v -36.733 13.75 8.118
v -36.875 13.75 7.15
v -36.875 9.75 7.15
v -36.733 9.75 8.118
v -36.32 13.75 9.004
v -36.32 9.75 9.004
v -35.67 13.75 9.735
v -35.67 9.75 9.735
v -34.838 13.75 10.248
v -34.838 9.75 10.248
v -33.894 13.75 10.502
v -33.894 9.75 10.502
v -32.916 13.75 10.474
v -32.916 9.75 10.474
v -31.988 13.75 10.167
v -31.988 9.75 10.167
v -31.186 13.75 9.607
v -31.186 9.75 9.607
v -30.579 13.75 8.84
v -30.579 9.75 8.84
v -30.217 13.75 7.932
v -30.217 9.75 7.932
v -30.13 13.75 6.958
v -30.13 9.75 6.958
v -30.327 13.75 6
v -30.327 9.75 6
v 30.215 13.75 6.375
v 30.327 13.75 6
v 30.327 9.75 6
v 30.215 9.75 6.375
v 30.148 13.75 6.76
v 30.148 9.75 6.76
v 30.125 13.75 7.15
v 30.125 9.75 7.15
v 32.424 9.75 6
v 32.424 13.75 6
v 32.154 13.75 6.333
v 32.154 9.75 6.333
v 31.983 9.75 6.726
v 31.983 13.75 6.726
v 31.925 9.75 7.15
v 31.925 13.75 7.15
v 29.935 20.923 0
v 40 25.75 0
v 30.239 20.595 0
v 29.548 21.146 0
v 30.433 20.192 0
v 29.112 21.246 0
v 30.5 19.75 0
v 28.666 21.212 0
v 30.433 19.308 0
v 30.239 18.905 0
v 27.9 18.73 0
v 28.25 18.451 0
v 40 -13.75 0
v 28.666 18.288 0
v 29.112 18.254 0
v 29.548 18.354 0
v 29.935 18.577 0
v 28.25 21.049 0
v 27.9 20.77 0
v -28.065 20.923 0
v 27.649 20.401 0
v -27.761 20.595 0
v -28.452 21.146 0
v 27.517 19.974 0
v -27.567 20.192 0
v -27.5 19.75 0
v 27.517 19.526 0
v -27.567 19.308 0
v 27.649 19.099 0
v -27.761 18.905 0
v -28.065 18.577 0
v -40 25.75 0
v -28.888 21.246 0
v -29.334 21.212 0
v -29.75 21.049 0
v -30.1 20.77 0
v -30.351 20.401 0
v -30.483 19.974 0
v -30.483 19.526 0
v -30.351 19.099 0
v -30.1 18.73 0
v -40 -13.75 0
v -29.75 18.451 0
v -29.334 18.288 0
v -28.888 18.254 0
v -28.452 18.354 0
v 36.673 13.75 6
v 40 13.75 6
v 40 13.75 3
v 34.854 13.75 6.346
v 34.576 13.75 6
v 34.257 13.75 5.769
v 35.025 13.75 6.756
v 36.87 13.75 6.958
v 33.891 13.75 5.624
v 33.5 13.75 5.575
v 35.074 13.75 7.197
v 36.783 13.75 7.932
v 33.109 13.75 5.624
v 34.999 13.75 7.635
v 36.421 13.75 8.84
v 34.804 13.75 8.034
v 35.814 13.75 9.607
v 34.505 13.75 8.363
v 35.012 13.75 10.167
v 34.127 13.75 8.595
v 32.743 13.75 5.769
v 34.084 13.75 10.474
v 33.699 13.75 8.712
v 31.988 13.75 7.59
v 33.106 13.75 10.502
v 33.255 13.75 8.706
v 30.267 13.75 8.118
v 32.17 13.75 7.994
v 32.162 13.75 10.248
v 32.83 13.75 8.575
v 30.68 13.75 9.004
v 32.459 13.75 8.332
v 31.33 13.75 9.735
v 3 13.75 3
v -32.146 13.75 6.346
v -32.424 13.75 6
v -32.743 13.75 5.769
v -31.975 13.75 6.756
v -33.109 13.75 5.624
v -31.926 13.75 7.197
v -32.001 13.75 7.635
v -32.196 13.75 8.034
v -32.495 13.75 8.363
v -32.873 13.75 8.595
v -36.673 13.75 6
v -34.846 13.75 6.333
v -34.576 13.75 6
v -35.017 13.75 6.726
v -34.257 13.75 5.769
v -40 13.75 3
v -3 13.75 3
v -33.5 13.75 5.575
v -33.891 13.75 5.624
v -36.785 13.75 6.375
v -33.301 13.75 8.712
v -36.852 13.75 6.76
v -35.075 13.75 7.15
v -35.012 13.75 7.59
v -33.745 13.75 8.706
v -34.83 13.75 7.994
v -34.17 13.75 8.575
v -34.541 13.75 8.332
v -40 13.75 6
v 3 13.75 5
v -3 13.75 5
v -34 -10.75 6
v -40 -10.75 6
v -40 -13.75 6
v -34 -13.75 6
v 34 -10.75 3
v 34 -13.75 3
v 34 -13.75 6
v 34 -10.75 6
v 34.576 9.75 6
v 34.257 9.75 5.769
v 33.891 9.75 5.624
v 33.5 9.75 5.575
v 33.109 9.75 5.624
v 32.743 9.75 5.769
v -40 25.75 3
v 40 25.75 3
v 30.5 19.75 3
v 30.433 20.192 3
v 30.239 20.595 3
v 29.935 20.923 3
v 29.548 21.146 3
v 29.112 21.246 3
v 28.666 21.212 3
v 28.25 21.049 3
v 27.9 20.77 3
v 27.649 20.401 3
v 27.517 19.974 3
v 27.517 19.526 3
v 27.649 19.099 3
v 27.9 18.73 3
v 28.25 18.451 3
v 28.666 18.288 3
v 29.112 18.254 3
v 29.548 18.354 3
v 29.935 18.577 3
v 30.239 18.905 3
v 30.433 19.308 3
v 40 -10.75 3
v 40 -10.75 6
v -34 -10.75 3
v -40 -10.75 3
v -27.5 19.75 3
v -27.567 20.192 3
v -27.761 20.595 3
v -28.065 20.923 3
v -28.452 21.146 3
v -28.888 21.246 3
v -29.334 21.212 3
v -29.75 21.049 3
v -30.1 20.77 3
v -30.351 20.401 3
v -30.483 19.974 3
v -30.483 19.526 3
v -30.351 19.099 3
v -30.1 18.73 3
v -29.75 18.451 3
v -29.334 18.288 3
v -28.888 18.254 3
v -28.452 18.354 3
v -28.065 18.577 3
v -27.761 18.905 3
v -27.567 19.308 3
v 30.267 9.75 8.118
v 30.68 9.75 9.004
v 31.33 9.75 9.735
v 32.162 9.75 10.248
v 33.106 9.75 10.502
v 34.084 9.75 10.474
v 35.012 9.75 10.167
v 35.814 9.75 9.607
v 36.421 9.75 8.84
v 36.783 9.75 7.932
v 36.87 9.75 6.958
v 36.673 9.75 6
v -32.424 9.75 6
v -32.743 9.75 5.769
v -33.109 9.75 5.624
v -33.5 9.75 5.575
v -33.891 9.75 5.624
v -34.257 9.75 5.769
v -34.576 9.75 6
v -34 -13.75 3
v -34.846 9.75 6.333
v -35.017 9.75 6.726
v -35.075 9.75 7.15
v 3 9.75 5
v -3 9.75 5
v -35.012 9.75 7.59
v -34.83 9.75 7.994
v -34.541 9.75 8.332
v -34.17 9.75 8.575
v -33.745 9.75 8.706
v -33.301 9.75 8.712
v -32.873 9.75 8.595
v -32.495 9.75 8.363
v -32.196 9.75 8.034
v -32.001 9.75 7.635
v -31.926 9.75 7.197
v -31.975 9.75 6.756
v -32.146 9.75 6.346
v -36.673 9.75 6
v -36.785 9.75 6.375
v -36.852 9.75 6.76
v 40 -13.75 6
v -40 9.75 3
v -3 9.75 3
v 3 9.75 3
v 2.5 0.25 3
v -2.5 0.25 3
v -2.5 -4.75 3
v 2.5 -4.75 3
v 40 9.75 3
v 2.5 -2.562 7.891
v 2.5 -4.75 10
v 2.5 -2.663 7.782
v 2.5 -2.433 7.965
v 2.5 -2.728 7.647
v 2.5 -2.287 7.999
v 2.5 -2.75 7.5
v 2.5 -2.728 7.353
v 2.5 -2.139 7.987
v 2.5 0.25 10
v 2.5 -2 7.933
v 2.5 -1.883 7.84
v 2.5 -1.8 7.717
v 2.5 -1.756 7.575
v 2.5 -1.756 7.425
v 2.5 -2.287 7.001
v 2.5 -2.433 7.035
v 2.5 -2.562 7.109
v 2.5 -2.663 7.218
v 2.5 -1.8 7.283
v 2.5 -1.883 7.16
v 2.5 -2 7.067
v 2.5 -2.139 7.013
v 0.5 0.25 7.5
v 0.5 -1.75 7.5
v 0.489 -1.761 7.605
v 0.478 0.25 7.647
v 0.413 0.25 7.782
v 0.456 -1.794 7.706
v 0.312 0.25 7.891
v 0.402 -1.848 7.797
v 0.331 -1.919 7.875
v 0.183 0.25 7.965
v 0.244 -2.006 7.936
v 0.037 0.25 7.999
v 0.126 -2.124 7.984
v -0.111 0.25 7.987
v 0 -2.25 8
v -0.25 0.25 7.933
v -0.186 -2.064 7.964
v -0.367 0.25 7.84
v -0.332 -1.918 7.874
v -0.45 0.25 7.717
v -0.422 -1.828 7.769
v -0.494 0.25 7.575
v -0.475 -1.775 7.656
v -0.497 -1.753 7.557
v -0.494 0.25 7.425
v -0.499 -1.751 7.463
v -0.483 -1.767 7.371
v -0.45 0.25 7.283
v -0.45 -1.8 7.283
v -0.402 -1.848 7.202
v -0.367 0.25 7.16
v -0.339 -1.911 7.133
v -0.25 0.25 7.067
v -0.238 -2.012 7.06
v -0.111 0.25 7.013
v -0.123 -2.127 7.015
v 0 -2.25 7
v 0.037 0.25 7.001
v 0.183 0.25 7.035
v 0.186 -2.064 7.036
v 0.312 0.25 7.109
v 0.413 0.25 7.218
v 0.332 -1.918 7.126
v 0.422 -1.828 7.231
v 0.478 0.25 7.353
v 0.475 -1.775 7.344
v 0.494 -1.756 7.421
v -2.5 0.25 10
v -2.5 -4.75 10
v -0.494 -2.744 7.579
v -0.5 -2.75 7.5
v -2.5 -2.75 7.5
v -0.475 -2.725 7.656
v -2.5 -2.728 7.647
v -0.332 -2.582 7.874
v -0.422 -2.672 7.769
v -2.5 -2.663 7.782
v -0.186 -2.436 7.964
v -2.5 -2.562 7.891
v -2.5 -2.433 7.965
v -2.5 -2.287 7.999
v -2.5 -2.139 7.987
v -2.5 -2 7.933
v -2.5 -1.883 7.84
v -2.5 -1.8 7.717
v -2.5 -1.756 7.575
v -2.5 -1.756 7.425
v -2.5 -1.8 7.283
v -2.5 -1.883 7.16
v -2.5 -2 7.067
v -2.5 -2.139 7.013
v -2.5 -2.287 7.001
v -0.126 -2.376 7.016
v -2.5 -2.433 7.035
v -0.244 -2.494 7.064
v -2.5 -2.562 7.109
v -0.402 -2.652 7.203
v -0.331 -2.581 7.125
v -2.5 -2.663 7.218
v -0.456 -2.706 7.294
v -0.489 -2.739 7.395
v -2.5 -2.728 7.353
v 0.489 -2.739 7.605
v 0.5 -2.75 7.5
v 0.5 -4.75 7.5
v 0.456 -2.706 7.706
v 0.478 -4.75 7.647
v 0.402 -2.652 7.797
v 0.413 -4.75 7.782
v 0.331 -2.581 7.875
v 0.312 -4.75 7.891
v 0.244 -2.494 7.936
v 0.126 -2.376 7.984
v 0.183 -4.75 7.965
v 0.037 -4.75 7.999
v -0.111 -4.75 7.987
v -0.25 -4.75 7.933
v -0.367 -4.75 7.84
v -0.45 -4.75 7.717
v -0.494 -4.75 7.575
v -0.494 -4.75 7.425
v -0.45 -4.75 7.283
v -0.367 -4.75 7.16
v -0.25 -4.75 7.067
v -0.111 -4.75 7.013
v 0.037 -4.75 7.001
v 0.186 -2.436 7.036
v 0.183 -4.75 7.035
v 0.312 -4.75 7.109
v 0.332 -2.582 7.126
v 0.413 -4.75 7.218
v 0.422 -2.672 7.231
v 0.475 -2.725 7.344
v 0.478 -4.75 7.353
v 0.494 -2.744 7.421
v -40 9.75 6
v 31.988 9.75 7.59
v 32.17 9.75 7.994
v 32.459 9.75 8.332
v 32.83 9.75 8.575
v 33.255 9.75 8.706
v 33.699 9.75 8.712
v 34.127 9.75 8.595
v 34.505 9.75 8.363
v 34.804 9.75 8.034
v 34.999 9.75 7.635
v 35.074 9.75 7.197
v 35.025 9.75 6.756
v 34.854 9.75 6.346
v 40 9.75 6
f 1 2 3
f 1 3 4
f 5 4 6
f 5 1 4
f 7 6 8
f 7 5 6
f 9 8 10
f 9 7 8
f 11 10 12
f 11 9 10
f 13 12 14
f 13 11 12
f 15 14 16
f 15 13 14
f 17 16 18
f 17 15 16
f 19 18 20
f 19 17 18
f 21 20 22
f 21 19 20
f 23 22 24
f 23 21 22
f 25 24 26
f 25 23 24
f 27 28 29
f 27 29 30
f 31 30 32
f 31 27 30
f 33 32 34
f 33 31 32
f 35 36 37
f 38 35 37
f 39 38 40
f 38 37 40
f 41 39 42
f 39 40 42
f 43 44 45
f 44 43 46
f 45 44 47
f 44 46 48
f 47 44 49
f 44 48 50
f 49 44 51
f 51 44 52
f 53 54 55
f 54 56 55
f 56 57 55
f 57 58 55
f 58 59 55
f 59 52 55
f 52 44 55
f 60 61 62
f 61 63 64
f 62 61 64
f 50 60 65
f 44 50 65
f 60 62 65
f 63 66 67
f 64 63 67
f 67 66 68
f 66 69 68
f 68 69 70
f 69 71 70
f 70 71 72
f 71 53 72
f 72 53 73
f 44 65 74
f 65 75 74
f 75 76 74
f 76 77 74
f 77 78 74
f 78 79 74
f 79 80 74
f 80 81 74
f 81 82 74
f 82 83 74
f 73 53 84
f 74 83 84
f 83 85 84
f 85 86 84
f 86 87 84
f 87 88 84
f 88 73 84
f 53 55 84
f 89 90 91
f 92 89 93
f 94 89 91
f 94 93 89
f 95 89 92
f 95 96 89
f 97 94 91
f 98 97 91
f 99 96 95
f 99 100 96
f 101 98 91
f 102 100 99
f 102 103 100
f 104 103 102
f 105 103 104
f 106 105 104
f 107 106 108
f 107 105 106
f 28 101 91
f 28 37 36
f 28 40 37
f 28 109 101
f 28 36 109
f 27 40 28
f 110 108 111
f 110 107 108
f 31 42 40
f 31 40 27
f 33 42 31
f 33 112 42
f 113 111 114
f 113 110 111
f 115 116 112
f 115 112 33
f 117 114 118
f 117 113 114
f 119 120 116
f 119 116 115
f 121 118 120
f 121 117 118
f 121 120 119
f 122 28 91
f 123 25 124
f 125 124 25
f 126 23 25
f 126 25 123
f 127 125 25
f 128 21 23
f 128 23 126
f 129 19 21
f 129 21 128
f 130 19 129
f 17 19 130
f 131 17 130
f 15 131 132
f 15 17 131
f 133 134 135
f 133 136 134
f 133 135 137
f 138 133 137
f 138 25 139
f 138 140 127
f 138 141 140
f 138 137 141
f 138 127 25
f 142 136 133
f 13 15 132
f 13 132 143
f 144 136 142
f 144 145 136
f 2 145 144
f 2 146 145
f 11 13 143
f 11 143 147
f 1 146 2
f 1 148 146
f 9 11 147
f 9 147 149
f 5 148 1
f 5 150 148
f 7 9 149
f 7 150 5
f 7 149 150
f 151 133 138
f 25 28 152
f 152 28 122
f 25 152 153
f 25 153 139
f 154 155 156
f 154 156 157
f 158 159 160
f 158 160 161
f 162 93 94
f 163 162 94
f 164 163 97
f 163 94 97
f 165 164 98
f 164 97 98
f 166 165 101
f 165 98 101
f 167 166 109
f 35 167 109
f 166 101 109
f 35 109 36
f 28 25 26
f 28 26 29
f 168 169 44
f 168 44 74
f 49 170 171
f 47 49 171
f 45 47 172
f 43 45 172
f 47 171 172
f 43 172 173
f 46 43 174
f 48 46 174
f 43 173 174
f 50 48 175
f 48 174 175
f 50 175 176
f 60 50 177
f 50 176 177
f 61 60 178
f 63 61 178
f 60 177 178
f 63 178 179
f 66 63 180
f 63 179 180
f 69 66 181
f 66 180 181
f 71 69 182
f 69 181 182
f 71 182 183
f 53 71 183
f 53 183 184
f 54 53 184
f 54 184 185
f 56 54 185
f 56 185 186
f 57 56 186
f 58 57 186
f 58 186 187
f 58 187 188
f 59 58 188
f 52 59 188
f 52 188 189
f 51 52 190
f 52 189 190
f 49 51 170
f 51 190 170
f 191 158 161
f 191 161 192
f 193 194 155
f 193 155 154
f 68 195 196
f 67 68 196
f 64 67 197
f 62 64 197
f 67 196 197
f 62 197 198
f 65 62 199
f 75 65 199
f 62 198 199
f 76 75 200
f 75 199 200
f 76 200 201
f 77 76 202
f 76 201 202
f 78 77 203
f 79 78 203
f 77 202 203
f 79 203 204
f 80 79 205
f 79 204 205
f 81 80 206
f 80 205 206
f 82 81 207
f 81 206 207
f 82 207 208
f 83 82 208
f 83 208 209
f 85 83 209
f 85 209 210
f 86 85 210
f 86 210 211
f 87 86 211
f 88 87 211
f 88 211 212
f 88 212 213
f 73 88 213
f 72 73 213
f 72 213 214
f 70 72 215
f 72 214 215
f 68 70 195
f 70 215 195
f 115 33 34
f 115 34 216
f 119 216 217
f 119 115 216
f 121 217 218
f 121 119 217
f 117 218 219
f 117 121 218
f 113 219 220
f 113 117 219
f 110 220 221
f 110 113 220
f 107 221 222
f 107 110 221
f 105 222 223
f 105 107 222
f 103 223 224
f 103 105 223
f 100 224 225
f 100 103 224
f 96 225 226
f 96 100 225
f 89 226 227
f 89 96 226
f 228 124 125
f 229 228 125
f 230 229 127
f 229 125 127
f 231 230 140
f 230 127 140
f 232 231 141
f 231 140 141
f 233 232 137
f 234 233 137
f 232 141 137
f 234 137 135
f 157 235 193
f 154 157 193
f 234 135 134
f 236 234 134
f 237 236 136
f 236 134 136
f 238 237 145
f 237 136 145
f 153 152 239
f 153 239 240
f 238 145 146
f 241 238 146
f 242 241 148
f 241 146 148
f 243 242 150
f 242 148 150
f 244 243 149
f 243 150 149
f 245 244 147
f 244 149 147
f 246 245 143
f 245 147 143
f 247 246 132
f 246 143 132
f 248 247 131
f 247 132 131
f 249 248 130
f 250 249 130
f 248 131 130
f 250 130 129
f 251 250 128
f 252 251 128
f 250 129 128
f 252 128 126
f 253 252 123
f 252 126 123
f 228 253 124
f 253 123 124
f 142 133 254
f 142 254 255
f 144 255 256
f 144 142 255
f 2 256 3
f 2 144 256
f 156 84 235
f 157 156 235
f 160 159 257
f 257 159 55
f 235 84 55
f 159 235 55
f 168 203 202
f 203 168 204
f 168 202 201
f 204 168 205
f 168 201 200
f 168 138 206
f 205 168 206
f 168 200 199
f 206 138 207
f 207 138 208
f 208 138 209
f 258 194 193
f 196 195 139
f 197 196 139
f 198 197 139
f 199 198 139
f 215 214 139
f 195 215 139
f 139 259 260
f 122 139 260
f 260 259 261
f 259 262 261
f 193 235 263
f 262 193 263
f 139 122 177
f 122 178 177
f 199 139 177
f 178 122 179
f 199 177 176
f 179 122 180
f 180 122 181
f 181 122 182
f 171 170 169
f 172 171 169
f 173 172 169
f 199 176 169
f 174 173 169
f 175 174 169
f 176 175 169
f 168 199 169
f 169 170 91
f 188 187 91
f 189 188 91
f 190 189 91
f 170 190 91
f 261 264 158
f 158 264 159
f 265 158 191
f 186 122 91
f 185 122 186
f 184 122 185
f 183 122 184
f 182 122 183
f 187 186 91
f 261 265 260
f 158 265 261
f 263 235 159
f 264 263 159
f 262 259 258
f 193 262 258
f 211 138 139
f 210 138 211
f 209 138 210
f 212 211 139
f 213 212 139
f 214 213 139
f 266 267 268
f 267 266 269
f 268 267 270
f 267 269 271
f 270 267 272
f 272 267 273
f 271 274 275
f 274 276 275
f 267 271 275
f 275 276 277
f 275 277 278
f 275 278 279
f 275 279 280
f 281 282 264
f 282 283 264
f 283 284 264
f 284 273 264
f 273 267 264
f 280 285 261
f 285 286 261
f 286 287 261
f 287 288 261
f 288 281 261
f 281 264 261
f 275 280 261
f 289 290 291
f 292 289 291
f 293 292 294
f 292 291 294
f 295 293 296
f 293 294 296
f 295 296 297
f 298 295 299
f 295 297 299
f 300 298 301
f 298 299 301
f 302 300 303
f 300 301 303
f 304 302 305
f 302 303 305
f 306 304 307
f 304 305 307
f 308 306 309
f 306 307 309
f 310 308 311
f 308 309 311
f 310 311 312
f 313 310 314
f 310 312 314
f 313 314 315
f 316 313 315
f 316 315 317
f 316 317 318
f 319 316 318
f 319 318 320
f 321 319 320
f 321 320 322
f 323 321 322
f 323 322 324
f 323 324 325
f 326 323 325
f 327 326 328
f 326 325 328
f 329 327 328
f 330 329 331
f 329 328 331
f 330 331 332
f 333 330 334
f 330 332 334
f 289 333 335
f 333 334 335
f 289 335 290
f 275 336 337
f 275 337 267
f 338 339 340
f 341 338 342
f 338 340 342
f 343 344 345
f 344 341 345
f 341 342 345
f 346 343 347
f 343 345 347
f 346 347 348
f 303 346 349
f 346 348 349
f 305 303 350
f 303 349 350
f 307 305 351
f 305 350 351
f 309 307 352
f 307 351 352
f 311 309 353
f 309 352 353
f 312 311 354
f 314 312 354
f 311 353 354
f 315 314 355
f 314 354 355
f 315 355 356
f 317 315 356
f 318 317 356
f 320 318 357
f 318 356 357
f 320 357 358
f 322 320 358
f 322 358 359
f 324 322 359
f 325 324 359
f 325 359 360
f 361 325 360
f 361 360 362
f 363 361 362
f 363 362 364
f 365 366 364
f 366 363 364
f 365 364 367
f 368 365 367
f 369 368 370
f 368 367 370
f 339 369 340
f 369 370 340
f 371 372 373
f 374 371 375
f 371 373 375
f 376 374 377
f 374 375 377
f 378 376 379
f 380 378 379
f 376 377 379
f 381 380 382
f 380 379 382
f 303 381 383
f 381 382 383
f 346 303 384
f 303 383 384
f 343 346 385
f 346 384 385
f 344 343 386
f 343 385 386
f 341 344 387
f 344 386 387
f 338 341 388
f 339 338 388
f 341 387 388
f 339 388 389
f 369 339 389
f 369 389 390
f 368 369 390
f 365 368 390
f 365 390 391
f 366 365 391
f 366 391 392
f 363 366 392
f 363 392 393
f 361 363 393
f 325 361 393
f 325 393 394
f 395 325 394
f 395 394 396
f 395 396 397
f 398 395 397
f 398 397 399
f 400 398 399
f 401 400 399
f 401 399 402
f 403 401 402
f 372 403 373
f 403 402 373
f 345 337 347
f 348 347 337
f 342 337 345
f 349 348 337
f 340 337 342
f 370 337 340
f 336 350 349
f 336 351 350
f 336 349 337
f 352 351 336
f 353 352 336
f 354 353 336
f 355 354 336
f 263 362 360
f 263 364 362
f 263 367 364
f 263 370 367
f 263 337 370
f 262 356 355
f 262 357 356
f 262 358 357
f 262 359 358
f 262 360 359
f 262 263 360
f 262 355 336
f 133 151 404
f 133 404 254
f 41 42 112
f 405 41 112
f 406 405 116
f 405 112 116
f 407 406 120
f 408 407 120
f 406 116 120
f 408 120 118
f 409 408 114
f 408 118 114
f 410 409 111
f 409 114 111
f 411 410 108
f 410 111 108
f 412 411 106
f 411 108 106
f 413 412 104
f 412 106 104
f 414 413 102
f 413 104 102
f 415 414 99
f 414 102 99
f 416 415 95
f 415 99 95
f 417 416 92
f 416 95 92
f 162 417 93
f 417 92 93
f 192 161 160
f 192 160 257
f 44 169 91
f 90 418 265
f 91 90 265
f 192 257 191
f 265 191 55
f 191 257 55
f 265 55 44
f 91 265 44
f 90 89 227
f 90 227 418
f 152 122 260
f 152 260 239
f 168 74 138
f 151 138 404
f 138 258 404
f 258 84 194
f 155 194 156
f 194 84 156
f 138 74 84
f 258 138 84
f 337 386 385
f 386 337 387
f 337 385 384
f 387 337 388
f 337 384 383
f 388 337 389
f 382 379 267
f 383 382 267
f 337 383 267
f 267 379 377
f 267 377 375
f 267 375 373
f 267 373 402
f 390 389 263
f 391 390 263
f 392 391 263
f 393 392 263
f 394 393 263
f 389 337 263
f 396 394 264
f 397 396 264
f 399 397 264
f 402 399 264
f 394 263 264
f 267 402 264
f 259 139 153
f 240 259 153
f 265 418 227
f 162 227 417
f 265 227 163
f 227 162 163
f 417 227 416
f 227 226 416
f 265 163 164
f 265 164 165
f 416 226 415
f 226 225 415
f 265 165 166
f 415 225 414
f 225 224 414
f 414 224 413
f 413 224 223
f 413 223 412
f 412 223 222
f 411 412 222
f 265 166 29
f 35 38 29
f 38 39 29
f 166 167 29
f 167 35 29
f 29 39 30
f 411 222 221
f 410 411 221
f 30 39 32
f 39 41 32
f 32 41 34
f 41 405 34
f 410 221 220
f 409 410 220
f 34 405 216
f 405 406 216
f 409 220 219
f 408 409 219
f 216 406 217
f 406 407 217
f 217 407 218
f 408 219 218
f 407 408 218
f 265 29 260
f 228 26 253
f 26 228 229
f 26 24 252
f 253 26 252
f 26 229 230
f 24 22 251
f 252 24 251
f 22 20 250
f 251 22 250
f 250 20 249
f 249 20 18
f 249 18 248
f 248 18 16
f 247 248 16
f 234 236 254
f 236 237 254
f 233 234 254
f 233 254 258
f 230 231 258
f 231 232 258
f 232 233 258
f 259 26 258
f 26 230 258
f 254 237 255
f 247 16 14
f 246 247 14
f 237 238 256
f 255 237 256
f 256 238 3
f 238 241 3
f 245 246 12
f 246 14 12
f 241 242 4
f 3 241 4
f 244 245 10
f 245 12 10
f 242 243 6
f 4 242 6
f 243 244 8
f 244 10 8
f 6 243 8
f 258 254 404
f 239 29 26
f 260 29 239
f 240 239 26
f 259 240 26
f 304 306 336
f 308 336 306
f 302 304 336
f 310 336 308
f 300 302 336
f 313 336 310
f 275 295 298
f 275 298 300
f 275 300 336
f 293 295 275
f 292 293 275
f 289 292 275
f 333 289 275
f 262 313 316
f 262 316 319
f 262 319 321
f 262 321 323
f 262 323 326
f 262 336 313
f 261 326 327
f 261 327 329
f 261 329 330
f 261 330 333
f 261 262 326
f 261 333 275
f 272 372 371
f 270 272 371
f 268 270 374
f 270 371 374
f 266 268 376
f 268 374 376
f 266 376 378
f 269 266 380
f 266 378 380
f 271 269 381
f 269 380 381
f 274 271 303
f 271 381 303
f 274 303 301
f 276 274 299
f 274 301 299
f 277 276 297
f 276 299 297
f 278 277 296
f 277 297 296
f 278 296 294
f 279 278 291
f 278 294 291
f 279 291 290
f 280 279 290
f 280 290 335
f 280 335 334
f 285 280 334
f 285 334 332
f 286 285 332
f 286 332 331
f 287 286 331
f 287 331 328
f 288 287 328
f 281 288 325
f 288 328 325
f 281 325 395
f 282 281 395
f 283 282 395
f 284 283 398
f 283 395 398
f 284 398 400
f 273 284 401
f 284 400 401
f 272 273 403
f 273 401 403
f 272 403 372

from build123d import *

# Parameters (mm, degrees)
F0_W      = 80
F0_H      = 27.5
F1_DEPTH  = 3
F2_W      = 80
F2_H      = 4
F2_W_2    = 6
F2_H_2    = 3
F3_DEPTH  = 3
F2_W_3    = 5
F2_H_3    = 5
F4_DEPTH  = 7
F5_R      = 0.5
F6_DEPTH  = 5
F7_W      = 6
F7_H      = 2
F8_DEPTH  = 4
F10_DEPTH = 4
F11_DEPTH = 4
F12_DEPTH = 4
F13_DEPTH = 4
F15_DEPTH = 12
F16_R     = 1.5
F17_DEPTH = 3
F18_R     = 0.5
F19_DEPTH = 42.501


with BuildPart() as f1:
    # F0 (on Top) → F1 (new body)
    with BuildSketch(Plane.XY):
        Rectangle(F0_W, F0_H)
    extrude(amount=F1_DEPTH)

    # F2 (on face) → F3 (join)
    with BuildSketch(Plane.XY.offset(3)):
        with Locations((0, 11.75)):
            Rectangle(F2_W, F2_H)
        with Locations((-37, -12.25)):
            Rectangle(F2_W_2, F2_H_2)
        with Locations((37, -12.25)):
            Rectangle(F2_W_2, F2_H_2)
    extrude(amount=F3_DEPTH)

    # F2 (on face) → F4 (join)
    with BuildSketch(Plane.XY.offset(3)):
        with Locations((0, -2.25)):
            Rectangle(F2_W_3, F2_H_3)
    extrude(amount=F4_DEPTH)

    # F5 (on face) → F6 (cut)
    with BuildSketch(Plane.XZ.offset(4.75)):
        with Locations((0, 7.5)):
            Circle(F5_R)
    extrude(amount=-F6_DEPTH, mode=Mode.SUBTRACT)

    # F7 (on face) → F8 (cut, through all)
    with BuildSketch(Plane(origin=(0, 13.75, 0), x_dir=(-1, 0, 0), z_dir=(0, 1, 0))):
        with Locations((0, 4)):
            Rectangle(F7_W, F7_H)
    extrude(amount=-F8_DEPTH, mode=Mode.SUBTRACT)

    # F9 (on face) → F10 (join)
    with BuildSketch(Plane(origin=(0, 13.75, 0), x_dir=(-1, 0, 0), z_dir=(0, 1, 0))):
        with BuildLine():
            ThreePointArc((-30.3269691146, 6), (-30.1758757365, 6.5661996225), (-30.125, 7.15))
            ThreePointArc((-30.125, 7.15), (-34.0838003775, 10.4741242635), (-36.6730308854, 6))
            Line((-36.6730308854, 6), (-34.5761621625, 6))
            ThreePointArc((-34.5761621625, 6), (-34.1267653445, 8.5949187531), (-31.925, 7.15))
            ThreePointArc((-31.925, 7.15), (-32.0550812469, 6.5232346555), (-32.4238378375, 6))
            Line((-32.4238378375, 6), (-30.3269691146, 6))
        make_face()
        with BuildLine():
            Line((-34.5761621625, 6), (-36.6730308854, 6))
            ThreePointArc((-36.6730308854, 6), (-33.5, 3.775), (-30.3269691146, 6))
            Line((-30.3269691146, 6), (-32.4238378375, 6))
            ThreePointArc((-32.4238378375, 6), (-33.5, 5.575), (-34.5761621625, 6))
        make_face()
        with BuildLine():
            Line((-32.4238378375, 6), (-34.5761621625, 6))
            ThreePointArc((-34.5761621625, 6), (-33.5, 5.575), (-32.4238378375, 6))
        make_face()
        with BuildLine():
            ThreePointArc((-31.925, 7.15), (-34.1267653445, 8.5949187531), (-34.5761621625, 6))
            Line((-34.5761621625, 6), (-32.4238378375, 6))
            ThreePointArc((-32.4238378375, 6), (-32.0550812469, 6.5232346555), (-31.925, 7.15))
        make_face()
    extrude(amount=-F10_DEPTH)

    # F9 (on face) → F11 (cut, through all)
    with BuildSketch(Plane(origin=(0, 13.75, 0), x_dir=(-1, 0, 0), z_dir=(0, 1, 0))):
        with BuildLine():
            Line((-32.4238378375, 6), (-34.5761621625, 6))
            ThreePointArc((-34.5761621625, 6), (-33.5, 5.575), (-32.4238378375, 6))
        make_face()
        with BuildLine():
            ThreePointArc((-31.925, 7.15), (-34.1267653445, 8.5949187531), (-34.5761621625, 6))
            Line((-34.5761621625, 6), (-32.4238378375, 6))
            ThreePointArc((-32.4238378375, 6), (-32.0550812469, 6.5232346555), (-31.925, 7.15))
        make_face()
    extrude(amount=-F11_DEPTH, mode=Mode.SUBTRACT)

    # F9 (on face) → F12 (join)
    with BuildSketch(Plane(origin=(0, 13.75, 0), x_dir=(-1, 0, 0), z_dir=(0, 1, 0))):
        with BuildLine():
            ThreePointArc((36.875, 7.15), (32.9161996225, 10.4741242635), (30.3269691146, 6))
            Line((30.3269691146, 6), (32.4238378375, 6))
            ThreePointArc((32.4238378375, 6), (32.8732346555, 8.5949187531), (35.075, 7.15))
            ThreePointArc((35.075, 7.15), (34.9449187531, 6.5232346555), (34.5761621625, 6))
            Line((34.5761621625, 6), (36.6730308854, 6))
            ThreePointArc((36.6730308854, 6), (36.8241242635, 6.5661996225), (36.875, 7.15))
        make_face()
        with BuildLine():
            ThreePointArc((35.075, 7.15), (32.8732346555, 8.5949187531), (32.4238378375, 6))
            Line((32.4238378375, 6), (34.5761621625, 6))
            ThreePointArc((34.5761621625, 6), (34.9449187531, 6.5232346555), (35.075, 7.15))
        make_face()
        with BuildLine():
            Line((34.5761621625, 6), (32.4238378375, 6))
            ThreePointArc((32.4238378375, 6), (33.5, 5.575), (34.5761621625, 6))
        make_face()
        with BuildLine():
            Line((32.4238378375, 6), (30.3269691146, 6))
            ThreePointArc((30.3269691146, 6), (33.5, 3.775), (36.6730308854, 6))
            Line((36.6730308854, 6), (34.5761621625, 6))
            ThreePointArc((34.5761621625, 6), (33.5, 5.575), (32.4238378375, 6))
        make_face()
    extrude(amount=-F12_DEPTH)

    # F9 (on face) → F13 (cut, through all)
    with BuildSketch(Plane(origin=(0, 13.75, 0), x_dir=(-1, 0, 0), z_dir=(0, 1, 0))):
        with BuildLine():
            ThreePointArc((35.075, 7.15), (32.8732346555, 8.5949187531), (32.4238378375, 6))
            Line((32.4238378375, 6), (34.5761621625, 6))
            ThreePointArc((34.5761621625, 6), (34.9449187531, 6.5232346555), (35.075, 7.15))
        make_face()
        with BuildLine():
            Line((34.5761621625, 6), (32.4238378375, 6))
            ThreePointArc((32.4238378375, 6), (33.5, 5.575), (34.5761621625, 6))
        make_face()
    extrude(amount=-F13_DEPTH, mode=Mode.SUBTRACT)

    # F14 (on face) → F15 (join)
    with BuildSketch(Plane(origin=(0, 13.75, 0), x_dir=(-1, 0, 0), z_dir=(0, 1, 0))):
        Polygon((-40, 3), (-40, 0), (40, 0), (40, 3), (3, 3), (-3, 3), align=None)
    extrude(amount=F15_DEPTH)

    # F16 (on face) → F17 (cut, through all)
    with BuildSketch(Plane.XY.offset(3)):
        with Locations((29, 19.75)):
            Circle(F16_R)
        with Locations((-29, 19.75)):
            Circle(F16_R)
    extrude(amount=-F17_DEPTH, mode=Mode.SUBTRACT)

    # F18 (on face) → F19 (cut, through all)
    with BuildSketch(Plane(origin=(-2.5, 0, 0), x_dir=(0, -1, 0), z_dir=(-1, 0, 0))):
        with Locations((2.25, 7.5)):
            Circle(F18_R)
    extrude(amount=-F19_DEPTH, mode=Mode.SUBTRACT)


solid = f1.part
